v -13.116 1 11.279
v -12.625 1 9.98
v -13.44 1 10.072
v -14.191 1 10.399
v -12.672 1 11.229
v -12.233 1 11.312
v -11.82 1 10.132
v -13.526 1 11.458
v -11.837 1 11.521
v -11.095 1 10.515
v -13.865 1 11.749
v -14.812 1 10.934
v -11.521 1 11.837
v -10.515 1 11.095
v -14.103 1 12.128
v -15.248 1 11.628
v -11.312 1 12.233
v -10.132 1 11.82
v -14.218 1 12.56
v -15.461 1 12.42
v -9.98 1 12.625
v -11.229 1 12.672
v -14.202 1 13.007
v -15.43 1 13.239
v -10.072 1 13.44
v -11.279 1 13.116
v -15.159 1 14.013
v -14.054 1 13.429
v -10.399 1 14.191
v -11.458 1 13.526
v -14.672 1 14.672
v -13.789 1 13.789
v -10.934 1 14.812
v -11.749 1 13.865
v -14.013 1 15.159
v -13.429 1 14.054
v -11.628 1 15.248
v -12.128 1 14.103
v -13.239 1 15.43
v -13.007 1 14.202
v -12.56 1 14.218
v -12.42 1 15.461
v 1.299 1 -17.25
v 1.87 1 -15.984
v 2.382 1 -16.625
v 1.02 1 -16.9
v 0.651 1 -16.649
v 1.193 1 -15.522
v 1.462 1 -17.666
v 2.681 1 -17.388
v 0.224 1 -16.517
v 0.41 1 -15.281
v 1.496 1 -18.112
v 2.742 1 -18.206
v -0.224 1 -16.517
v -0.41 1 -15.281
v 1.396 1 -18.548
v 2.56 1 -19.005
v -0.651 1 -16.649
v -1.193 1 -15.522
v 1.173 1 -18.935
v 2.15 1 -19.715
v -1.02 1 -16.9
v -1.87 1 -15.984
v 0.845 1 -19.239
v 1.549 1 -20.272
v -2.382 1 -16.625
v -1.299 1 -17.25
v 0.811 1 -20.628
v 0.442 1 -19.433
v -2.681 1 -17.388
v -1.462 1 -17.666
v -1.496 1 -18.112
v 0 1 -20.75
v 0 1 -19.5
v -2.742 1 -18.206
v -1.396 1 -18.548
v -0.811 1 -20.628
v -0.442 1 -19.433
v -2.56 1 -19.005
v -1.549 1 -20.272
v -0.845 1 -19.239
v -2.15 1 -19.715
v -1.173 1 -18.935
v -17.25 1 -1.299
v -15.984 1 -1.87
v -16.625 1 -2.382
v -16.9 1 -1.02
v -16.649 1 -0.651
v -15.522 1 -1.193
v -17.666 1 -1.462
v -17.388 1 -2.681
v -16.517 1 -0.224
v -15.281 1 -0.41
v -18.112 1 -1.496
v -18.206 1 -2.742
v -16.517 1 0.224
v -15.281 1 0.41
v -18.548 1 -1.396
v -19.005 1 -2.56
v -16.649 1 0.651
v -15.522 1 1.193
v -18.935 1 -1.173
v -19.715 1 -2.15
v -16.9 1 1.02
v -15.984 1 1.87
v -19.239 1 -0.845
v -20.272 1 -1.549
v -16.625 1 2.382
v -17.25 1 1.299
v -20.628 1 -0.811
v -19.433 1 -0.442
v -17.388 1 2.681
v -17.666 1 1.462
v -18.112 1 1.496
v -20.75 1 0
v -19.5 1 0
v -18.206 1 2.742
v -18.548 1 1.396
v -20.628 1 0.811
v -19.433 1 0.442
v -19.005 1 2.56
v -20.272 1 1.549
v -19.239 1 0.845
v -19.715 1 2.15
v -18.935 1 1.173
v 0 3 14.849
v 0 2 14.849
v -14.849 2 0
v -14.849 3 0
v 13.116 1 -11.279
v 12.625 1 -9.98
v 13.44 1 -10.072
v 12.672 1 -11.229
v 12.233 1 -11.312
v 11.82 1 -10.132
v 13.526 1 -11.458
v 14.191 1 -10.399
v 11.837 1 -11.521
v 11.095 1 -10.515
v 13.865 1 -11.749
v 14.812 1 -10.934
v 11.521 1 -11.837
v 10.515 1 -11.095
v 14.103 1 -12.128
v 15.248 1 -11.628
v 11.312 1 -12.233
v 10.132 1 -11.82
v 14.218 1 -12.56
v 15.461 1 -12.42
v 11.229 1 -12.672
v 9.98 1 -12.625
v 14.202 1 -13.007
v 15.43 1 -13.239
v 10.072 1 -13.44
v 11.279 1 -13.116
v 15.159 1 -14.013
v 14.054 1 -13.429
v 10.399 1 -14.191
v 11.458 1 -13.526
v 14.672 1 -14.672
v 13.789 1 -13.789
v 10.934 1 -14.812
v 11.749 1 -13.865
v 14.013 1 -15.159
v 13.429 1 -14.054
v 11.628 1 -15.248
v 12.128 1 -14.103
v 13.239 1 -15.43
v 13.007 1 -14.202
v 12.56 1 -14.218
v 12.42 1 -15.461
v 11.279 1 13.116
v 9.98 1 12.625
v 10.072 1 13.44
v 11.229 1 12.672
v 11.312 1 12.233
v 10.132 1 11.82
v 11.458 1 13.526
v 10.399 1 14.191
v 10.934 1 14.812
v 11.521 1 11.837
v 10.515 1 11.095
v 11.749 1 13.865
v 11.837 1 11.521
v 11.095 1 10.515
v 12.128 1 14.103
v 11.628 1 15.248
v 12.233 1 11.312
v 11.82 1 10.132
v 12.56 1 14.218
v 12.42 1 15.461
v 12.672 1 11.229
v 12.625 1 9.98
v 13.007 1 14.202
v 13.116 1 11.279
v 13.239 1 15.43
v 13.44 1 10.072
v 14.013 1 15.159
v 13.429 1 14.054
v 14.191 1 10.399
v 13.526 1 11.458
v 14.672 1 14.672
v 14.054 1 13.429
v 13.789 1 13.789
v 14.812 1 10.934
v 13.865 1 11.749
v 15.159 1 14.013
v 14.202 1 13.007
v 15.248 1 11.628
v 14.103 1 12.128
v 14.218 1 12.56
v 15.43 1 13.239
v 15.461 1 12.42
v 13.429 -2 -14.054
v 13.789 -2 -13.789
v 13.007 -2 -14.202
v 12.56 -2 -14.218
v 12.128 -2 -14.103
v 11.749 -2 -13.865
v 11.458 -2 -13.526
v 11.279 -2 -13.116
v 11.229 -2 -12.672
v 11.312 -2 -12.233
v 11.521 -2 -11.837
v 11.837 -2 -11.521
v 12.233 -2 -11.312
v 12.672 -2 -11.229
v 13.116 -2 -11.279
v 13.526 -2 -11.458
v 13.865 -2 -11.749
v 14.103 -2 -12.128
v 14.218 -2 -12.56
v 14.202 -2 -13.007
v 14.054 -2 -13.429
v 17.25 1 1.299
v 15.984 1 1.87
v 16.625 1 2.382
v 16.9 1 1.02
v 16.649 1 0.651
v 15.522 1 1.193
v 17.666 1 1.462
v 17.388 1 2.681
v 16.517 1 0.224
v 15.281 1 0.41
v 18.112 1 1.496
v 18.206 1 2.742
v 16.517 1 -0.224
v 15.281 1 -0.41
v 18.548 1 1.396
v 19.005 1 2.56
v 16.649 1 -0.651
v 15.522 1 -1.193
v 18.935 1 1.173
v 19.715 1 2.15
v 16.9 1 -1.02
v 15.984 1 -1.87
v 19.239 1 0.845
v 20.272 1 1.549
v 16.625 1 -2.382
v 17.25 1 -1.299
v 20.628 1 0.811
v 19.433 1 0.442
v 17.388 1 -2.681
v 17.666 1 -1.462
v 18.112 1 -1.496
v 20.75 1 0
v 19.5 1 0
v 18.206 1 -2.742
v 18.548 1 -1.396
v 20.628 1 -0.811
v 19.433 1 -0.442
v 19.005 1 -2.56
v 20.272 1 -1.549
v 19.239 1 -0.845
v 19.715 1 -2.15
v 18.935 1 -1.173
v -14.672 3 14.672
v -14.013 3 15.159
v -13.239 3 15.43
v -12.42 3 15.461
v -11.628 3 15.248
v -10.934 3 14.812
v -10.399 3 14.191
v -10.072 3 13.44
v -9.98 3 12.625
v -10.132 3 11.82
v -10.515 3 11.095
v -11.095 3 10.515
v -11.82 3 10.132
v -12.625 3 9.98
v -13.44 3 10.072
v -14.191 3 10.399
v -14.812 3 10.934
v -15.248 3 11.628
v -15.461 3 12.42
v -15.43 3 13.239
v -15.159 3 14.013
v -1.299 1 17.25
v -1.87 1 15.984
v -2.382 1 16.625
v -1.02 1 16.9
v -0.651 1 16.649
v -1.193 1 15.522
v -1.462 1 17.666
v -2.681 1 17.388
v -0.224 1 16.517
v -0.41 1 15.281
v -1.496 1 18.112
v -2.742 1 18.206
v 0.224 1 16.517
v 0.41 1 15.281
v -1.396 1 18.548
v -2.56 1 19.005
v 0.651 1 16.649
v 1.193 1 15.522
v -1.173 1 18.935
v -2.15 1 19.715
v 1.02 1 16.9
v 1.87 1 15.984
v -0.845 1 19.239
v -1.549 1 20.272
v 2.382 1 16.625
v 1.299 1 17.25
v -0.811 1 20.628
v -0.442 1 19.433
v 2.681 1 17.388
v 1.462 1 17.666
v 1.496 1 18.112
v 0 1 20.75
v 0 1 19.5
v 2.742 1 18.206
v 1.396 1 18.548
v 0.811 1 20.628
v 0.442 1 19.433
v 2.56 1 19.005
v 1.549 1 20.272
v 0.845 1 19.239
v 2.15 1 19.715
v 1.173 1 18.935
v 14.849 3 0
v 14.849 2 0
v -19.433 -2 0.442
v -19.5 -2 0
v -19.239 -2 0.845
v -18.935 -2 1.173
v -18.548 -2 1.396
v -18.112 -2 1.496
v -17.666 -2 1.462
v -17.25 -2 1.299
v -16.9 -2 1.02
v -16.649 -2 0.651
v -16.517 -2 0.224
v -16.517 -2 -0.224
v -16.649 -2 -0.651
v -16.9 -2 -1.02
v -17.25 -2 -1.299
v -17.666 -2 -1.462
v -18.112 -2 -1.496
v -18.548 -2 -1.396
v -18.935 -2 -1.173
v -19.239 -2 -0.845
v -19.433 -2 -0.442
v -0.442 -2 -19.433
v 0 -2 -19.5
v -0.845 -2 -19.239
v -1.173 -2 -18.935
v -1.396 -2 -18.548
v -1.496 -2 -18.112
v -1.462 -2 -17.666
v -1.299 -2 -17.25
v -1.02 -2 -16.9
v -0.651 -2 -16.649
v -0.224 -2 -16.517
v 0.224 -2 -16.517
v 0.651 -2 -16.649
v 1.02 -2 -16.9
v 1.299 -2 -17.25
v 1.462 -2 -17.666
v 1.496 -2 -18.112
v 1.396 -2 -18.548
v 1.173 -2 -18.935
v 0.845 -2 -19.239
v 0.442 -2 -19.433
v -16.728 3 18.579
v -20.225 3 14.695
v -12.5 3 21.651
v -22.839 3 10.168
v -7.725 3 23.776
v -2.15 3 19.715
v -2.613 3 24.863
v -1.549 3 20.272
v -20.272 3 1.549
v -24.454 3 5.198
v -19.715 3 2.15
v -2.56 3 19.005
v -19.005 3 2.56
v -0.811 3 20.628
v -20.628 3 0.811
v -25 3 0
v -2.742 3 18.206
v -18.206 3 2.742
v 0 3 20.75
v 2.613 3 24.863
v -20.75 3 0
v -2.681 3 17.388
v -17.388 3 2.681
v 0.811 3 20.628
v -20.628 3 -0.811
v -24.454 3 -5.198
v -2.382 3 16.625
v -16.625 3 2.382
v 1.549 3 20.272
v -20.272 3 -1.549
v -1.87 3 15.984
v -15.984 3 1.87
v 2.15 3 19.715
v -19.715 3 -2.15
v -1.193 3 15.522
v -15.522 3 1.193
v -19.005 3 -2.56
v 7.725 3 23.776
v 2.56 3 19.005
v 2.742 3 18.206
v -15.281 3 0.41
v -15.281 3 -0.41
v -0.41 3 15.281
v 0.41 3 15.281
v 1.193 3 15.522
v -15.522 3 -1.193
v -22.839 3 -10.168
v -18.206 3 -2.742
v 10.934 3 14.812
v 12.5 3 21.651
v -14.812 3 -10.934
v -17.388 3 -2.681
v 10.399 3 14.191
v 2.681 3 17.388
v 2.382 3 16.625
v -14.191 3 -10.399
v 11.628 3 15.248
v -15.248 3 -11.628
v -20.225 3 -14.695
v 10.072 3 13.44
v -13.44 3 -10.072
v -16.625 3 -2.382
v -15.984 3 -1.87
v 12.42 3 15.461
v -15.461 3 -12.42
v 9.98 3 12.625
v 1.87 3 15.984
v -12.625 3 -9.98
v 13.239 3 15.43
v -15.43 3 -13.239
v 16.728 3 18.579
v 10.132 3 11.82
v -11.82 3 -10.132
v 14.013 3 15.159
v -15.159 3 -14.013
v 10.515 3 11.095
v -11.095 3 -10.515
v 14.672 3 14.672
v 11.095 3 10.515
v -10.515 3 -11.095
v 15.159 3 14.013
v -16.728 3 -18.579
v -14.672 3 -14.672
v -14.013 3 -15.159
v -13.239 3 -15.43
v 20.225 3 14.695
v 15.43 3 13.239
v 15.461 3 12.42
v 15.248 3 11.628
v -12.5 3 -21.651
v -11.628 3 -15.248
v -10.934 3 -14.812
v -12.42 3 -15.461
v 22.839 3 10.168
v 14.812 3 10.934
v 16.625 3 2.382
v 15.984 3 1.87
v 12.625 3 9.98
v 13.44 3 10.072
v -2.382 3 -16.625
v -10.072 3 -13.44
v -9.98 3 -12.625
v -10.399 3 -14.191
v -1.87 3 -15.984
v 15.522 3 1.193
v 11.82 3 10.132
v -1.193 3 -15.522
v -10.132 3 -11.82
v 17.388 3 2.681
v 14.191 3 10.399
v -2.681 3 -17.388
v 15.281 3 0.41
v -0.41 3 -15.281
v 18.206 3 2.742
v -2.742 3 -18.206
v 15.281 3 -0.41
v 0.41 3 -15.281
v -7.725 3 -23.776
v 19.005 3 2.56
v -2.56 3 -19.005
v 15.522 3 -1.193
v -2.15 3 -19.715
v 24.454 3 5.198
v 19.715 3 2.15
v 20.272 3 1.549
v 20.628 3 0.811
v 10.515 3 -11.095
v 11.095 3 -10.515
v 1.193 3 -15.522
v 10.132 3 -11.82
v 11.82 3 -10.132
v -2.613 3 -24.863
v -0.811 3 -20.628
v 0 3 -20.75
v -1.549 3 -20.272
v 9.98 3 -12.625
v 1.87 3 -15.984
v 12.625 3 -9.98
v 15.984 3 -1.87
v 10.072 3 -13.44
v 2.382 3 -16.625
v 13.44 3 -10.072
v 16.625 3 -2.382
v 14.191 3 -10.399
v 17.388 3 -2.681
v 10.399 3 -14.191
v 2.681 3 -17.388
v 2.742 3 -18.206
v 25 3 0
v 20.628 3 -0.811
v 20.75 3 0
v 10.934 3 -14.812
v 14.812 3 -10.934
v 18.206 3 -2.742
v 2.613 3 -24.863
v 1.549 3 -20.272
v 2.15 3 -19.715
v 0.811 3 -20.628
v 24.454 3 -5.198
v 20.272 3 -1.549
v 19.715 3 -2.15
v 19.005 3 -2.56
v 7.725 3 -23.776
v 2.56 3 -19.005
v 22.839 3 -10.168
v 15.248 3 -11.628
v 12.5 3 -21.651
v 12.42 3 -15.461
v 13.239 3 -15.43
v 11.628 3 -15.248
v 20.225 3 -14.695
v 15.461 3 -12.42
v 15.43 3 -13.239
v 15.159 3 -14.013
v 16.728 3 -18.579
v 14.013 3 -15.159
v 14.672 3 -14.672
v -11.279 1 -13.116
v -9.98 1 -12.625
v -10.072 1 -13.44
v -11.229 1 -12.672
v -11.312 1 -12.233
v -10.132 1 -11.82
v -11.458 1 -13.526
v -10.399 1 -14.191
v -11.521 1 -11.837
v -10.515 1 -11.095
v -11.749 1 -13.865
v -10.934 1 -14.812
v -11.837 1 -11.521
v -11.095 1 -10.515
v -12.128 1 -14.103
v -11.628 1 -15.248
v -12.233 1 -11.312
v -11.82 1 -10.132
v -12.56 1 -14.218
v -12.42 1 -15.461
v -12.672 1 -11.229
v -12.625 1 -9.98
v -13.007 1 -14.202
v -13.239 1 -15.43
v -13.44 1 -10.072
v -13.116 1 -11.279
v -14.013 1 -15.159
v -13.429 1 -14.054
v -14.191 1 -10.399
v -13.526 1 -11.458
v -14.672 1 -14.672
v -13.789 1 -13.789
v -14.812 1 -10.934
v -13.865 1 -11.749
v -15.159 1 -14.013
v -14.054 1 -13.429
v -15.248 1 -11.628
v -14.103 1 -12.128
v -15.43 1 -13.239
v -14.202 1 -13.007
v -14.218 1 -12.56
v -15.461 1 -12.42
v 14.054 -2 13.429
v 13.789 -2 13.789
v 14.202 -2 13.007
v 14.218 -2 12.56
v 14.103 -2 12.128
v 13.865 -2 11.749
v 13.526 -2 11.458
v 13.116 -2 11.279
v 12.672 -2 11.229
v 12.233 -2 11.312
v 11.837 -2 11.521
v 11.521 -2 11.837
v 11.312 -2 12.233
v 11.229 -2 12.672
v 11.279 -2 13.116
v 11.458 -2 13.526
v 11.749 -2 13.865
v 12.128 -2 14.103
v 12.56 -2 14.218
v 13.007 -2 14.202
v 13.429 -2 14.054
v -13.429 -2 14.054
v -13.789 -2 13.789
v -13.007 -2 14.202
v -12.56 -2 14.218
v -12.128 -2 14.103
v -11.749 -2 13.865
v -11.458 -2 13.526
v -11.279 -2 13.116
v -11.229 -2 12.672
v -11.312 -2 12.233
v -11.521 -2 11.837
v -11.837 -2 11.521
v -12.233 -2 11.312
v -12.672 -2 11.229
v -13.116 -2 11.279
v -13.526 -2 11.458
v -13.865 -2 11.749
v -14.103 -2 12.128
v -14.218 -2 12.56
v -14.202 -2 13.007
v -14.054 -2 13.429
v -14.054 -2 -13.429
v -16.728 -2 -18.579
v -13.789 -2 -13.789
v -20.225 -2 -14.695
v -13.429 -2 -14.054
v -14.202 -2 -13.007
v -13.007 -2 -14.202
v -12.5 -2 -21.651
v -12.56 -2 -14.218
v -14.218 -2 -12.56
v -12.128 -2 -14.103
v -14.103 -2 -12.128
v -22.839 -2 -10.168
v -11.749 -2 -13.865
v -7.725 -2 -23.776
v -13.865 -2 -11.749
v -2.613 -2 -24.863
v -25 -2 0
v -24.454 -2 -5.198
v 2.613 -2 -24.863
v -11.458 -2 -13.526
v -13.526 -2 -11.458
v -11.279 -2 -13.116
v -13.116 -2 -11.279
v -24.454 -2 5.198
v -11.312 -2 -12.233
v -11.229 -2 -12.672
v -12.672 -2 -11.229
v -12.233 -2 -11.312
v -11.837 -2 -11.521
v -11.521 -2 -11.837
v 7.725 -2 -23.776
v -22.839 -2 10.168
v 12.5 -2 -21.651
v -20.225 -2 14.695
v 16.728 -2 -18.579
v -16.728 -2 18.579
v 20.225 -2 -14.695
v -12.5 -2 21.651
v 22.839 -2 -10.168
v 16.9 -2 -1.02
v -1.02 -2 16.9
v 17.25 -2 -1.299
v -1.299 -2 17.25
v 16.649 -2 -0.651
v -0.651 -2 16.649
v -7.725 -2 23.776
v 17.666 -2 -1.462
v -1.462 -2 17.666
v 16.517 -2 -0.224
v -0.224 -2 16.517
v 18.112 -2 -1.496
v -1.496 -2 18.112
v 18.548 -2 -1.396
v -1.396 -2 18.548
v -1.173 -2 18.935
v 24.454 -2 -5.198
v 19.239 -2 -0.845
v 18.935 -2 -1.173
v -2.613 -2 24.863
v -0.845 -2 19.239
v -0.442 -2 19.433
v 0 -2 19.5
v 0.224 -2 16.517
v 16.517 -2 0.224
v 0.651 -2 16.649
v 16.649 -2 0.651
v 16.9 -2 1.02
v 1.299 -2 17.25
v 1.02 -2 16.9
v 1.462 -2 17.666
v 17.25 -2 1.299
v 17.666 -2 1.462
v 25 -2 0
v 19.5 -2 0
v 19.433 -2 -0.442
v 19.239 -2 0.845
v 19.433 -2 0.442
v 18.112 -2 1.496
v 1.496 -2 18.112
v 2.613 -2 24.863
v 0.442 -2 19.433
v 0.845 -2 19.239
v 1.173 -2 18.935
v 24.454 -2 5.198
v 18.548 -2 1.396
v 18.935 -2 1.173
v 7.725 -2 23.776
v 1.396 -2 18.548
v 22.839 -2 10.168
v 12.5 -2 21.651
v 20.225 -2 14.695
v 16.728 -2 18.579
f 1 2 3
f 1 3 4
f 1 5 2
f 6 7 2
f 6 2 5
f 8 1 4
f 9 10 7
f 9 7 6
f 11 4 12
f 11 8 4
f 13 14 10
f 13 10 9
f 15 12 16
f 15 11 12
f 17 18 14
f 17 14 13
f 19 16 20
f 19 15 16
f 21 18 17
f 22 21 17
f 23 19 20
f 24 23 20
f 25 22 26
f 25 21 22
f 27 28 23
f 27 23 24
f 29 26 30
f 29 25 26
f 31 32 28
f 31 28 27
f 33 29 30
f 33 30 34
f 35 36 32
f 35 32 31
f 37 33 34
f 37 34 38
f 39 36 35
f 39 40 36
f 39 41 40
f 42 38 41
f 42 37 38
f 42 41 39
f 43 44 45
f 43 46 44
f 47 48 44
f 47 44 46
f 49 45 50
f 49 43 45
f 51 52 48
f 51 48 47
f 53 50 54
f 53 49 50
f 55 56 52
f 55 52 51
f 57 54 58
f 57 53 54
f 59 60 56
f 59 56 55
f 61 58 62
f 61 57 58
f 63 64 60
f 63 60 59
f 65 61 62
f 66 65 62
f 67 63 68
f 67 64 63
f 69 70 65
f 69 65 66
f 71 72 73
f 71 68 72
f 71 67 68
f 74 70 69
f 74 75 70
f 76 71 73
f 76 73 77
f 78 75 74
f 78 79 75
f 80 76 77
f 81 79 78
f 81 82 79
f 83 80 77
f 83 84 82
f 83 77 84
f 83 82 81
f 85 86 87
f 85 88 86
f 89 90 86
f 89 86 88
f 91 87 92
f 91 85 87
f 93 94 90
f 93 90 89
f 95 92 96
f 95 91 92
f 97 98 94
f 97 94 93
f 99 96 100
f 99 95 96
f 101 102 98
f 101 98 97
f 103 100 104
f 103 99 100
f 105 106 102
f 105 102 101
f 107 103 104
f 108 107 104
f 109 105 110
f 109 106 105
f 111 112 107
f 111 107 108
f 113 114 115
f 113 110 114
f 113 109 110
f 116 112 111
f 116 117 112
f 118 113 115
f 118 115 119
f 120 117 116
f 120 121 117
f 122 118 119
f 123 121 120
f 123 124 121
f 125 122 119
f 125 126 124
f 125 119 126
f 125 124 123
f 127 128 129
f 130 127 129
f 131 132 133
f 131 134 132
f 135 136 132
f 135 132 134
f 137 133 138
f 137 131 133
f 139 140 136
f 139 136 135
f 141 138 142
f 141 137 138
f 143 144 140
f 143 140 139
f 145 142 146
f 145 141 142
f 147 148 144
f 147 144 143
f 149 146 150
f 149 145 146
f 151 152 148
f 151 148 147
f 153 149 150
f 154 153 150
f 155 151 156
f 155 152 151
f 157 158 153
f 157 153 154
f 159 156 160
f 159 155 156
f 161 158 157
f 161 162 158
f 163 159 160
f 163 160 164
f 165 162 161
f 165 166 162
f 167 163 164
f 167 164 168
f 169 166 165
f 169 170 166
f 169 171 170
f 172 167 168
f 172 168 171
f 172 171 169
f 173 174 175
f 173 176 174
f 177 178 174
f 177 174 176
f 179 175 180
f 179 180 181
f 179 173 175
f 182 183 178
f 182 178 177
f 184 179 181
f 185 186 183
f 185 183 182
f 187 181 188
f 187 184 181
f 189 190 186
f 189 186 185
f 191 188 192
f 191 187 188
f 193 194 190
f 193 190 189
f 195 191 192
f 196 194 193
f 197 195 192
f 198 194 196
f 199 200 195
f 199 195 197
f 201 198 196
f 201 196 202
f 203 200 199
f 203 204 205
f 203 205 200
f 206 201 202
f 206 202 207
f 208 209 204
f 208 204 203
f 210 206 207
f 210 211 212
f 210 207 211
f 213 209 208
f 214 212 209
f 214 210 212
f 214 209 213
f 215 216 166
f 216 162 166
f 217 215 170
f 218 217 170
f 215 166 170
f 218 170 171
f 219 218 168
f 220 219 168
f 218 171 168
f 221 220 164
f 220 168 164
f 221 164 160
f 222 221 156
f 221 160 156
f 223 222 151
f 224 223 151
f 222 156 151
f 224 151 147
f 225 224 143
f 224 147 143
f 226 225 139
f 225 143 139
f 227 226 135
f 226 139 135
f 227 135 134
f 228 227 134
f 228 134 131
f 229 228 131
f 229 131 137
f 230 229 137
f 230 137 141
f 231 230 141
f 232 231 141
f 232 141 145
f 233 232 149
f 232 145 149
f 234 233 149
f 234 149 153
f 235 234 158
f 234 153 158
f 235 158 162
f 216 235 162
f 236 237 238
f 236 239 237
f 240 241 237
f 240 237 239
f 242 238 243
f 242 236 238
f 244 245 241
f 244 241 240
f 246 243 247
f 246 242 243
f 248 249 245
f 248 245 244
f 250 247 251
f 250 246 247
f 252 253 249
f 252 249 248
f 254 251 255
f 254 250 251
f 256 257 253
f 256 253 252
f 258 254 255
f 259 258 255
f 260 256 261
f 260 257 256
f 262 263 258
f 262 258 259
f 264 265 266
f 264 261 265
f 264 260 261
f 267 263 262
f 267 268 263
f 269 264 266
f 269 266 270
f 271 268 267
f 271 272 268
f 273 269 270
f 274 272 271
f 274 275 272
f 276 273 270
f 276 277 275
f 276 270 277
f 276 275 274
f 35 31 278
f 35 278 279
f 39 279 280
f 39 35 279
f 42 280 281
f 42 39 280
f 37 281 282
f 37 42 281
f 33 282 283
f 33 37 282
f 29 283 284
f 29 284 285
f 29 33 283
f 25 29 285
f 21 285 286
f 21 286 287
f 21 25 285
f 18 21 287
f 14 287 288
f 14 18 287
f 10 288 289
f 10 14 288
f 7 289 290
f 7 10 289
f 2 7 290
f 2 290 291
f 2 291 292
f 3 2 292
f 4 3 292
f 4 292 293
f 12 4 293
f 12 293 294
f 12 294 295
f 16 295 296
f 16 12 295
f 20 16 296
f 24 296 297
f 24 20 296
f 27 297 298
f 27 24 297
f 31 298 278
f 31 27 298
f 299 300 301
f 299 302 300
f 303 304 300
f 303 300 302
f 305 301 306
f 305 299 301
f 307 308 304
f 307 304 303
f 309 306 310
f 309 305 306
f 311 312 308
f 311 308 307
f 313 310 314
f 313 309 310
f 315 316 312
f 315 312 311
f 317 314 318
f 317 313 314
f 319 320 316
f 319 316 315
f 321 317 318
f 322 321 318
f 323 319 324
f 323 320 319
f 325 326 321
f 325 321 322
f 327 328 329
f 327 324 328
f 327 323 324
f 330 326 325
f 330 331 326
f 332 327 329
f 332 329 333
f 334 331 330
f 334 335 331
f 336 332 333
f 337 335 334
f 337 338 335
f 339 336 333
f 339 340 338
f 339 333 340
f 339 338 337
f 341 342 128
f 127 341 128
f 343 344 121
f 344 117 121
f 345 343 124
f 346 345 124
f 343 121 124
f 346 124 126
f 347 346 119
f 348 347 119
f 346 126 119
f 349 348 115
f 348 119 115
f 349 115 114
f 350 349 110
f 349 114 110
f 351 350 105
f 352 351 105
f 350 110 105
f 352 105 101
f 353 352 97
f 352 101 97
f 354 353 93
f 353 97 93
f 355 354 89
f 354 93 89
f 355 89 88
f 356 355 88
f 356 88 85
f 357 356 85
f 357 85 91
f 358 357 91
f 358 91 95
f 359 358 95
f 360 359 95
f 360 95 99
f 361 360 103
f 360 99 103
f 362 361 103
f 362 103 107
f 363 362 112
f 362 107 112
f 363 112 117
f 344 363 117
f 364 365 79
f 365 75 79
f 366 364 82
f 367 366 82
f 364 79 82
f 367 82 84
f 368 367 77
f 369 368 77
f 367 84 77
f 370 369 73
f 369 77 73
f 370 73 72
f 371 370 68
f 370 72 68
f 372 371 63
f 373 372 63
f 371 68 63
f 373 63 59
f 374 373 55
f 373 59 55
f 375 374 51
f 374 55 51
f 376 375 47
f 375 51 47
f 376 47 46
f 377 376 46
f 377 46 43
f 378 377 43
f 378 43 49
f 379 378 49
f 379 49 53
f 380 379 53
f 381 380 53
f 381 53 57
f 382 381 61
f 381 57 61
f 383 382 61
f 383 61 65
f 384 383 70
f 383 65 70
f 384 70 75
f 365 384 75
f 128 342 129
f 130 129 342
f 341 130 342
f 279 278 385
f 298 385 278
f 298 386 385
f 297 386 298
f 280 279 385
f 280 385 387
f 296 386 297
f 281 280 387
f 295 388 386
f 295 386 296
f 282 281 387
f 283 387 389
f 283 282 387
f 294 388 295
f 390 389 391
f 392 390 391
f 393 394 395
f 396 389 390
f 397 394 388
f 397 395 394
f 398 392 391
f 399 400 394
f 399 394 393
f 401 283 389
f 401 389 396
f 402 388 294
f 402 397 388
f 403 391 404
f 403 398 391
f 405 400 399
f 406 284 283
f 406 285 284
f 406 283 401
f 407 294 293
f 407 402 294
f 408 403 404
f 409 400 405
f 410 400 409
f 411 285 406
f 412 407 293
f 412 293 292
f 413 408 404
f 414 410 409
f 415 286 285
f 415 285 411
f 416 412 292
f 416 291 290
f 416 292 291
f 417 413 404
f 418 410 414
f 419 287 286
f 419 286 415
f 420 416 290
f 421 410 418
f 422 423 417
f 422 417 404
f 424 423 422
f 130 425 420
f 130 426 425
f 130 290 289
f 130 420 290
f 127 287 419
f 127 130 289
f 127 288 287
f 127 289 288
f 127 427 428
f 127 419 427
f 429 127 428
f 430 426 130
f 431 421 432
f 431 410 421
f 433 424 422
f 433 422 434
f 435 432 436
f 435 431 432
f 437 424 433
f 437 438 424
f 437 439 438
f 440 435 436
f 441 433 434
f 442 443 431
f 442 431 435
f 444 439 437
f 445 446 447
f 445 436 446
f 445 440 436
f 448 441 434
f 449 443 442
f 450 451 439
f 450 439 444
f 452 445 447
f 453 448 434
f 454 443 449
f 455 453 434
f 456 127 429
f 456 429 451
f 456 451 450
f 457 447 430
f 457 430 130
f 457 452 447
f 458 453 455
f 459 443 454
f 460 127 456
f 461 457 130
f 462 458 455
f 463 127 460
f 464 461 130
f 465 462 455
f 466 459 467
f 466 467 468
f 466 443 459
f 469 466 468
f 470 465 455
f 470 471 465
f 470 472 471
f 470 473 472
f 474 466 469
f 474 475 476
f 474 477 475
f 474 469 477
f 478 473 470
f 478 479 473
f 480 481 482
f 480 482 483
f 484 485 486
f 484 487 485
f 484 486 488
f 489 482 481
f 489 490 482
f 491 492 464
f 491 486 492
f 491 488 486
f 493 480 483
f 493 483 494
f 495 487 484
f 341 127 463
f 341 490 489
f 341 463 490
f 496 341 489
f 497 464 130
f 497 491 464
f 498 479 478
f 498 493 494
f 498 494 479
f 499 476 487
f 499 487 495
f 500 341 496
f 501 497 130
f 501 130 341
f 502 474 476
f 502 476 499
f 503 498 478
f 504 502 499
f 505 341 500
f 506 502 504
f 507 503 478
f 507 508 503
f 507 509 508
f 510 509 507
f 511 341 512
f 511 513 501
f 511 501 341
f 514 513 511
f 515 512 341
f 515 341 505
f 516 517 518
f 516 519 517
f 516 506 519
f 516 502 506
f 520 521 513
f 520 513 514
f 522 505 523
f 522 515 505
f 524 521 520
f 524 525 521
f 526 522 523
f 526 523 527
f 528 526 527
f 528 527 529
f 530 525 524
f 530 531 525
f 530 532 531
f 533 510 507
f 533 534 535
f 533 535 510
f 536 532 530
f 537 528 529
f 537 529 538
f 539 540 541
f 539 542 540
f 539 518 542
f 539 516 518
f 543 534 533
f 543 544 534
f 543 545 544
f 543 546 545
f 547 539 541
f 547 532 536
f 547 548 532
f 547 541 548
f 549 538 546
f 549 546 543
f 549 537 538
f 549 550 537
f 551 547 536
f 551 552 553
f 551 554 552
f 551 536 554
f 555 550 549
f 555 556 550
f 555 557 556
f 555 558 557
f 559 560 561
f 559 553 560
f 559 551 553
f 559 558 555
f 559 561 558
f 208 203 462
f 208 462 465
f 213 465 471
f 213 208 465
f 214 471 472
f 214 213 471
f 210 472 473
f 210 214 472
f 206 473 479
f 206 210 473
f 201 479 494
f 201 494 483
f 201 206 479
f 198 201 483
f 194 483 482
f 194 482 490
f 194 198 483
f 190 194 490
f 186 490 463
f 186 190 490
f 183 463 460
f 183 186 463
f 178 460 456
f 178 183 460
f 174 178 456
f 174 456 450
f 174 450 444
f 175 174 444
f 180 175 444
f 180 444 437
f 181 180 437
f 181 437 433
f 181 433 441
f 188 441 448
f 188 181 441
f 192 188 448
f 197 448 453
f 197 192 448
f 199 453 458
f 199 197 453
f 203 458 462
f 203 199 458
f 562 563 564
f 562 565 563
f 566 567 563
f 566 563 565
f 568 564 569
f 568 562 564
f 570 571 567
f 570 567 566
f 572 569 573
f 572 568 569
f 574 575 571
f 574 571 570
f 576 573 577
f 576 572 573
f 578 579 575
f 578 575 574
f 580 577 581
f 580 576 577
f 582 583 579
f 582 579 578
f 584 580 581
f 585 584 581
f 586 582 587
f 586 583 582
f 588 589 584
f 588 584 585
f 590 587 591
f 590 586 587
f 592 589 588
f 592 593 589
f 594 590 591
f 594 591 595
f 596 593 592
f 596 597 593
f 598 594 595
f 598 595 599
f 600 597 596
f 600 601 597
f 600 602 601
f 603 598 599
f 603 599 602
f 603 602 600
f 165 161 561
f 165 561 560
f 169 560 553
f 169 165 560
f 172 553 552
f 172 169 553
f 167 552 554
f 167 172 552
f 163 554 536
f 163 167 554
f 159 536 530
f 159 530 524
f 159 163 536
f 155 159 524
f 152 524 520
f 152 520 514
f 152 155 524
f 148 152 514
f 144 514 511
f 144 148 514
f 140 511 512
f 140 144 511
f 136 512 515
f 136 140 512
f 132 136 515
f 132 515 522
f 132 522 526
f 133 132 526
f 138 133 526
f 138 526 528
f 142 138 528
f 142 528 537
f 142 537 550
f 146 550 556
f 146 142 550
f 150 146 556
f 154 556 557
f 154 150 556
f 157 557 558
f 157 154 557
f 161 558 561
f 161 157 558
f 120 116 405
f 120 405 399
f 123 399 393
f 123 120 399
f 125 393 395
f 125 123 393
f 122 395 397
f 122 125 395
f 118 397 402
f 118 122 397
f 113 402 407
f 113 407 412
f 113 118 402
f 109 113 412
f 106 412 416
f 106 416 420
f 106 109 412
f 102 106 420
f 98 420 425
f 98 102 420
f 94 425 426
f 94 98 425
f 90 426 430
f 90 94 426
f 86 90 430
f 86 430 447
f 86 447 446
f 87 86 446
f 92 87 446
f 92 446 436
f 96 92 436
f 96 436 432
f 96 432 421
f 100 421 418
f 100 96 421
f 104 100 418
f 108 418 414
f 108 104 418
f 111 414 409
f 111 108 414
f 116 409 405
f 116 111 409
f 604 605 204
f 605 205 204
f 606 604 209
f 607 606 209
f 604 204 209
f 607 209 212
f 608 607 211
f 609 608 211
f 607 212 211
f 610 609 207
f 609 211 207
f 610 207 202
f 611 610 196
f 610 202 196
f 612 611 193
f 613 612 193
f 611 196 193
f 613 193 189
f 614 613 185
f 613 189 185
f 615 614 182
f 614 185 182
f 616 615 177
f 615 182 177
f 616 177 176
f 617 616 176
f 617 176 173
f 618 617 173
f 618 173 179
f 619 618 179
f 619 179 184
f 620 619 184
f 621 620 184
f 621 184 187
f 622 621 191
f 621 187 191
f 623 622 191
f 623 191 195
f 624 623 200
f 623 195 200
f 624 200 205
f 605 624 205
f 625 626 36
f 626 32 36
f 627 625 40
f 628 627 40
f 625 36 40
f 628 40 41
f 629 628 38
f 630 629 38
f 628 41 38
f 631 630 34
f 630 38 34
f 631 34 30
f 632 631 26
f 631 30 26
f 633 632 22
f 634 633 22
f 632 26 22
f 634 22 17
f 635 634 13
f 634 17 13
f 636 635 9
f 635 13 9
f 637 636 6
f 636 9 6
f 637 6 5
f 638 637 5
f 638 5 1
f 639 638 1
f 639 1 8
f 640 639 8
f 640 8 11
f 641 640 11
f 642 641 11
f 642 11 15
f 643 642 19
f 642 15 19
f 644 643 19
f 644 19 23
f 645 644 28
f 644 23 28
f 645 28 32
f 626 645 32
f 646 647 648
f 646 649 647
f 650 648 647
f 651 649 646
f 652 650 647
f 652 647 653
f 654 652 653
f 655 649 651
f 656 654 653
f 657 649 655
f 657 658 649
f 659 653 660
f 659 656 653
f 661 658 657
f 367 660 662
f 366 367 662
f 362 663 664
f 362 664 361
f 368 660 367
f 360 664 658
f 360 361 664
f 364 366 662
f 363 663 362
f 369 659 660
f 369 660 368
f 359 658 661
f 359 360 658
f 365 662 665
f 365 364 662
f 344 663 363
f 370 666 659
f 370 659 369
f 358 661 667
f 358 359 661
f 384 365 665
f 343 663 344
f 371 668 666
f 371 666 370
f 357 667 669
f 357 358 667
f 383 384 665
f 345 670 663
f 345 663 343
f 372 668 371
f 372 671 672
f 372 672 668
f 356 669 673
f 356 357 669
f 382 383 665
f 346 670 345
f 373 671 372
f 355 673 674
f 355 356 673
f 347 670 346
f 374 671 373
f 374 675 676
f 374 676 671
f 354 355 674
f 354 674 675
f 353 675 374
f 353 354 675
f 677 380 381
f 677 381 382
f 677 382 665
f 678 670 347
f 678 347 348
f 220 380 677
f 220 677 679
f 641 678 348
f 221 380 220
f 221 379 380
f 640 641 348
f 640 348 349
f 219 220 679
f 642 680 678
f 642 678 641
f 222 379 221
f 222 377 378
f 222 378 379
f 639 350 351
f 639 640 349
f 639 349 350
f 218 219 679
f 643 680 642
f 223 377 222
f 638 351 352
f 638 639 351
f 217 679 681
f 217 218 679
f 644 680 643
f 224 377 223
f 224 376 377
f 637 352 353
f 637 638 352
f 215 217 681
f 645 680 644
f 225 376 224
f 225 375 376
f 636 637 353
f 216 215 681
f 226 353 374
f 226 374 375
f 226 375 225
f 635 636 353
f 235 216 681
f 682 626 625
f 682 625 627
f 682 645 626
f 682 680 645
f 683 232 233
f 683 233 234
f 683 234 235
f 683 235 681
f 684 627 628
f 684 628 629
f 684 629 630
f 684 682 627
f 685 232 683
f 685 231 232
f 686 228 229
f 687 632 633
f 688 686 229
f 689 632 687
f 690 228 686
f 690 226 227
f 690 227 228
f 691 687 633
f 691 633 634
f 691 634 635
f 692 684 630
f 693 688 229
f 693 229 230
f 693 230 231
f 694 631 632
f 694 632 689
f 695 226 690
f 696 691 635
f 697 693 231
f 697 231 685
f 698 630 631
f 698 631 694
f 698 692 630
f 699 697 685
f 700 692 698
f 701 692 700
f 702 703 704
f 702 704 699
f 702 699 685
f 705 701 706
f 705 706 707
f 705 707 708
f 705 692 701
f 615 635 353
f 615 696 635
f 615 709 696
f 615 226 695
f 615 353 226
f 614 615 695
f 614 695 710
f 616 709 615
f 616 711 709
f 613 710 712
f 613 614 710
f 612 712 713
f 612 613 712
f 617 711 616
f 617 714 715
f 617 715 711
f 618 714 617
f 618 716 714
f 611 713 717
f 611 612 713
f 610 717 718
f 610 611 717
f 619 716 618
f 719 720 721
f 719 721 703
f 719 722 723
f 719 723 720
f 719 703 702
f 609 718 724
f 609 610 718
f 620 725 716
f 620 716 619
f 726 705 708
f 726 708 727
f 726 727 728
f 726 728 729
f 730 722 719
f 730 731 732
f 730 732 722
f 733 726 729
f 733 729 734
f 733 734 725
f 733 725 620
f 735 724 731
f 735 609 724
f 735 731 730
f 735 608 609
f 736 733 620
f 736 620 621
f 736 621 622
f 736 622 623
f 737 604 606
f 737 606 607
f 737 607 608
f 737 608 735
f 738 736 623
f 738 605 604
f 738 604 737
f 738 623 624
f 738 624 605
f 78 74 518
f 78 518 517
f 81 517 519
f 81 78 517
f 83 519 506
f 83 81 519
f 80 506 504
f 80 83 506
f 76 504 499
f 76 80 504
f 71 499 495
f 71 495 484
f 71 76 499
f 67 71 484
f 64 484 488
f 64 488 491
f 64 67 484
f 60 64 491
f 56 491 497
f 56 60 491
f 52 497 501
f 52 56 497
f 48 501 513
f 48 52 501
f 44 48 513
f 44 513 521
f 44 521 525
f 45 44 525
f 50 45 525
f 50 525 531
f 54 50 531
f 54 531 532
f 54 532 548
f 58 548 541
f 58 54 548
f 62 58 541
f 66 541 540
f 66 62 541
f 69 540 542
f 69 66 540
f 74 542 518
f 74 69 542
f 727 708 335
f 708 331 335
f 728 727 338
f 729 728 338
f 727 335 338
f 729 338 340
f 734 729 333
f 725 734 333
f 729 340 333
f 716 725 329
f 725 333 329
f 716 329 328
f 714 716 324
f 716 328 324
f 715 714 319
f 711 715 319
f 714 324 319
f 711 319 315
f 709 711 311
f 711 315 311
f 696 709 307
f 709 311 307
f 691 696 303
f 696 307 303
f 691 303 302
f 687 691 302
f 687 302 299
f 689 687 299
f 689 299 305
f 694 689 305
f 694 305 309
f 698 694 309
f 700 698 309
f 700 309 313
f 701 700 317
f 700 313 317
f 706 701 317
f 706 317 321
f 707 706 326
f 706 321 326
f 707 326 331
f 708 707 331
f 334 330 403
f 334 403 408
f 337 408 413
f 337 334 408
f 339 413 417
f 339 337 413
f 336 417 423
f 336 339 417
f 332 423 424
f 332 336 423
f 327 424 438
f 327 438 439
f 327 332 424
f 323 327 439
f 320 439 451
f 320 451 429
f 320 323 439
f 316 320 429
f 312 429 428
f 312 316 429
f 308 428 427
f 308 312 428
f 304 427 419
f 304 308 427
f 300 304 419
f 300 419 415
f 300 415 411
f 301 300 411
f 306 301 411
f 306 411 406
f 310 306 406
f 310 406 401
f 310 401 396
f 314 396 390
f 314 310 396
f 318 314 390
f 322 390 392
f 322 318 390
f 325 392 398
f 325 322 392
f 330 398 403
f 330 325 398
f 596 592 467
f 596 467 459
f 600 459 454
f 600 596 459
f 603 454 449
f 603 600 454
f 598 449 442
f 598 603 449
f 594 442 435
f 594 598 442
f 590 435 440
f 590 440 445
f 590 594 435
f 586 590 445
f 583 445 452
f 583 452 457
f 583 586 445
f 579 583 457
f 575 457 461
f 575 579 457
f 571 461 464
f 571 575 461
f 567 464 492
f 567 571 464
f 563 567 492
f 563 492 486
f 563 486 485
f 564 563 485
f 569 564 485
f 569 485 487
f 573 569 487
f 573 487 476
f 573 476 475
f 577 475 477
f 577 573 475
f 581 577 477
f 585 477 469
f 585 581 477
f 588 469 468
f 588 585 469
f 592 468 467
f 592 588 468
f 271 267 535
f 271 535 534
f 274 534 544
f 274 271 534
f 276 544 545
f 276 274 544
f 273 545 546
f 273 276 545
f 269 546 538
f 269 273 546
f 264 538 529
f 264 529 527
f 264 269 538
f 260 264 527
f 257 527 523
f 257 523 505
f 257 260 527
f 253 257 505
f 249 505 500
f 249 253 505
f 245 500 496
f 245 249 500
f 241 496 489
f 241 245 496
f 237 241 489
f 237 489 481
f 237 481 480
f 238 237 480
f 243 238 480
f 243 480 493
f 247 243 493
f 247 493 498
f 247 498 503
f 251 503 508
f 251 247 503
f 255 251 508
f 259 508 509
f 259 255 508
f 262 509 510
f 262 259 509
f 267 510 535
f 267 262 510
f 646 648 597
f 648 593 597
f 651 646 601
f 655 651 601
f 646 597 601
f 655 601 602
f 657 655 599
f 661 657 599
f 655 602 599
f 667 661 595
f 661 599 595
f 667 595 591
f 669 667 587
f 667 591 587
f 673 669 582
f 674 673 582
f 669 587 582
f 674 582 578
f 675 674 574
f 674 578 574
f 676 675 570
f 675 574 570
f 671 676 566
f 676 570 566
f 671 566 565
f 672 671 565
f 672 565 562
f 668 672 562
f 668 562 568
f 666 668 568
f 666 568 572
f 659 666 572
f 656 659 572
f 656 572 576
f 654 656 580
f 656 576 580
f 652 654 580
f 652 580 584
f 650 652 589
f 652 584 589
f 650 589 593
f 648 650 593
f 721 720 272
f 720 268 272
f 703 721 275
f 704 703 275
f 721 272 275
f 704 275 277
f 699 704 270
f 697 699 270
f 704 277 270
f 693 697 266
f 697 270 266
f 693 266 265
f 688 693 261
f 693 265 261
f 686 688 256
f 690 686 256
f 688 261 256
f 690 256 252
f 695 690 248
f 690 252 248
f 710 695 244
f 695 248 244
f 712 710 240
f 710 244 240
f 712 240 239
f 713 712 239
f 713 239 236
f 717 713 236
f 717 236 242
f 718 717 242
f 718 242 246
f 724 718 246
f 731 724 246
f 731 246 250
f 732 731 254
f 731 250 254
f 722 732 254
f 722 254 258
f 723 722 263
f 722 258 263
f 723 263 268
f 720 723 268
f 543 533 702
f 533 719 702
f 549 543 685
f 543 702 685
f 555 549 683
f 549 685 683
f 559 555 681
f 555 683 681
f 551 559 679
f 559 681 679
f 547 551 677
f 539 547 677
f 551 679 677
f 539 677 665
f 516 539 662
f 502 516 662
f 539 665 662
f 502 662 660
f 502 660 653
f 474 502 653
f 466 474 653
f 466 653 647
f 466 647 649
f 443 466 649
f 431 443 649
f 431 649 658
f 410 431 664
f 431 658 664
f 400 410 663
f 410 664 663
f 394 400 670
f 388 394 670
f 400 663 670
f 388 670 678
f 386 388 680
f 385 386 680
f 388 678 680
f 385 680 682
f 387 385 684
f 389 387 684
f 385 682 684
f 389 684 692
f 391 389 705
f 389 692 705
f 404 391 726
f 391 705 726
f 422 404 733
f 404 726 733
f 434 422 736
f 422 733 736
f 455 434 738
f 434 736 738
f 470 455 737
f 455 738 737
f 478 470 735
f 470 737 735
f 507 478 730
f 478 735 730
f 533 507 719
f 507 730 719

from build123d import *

# Parameters (mm, degrees)
SKETCH_1_R               = 25
EXTRUDE_2_DEPTH          = 1
SKETCH_2_R               = 1.5
CUT_EXTRUDE_1_DEPTH      = 1
PATTERN_CIRCULAR_1_COUNT = 8
CUT_EXTRUDE_2_DEPTH      = 1
EXTRUDE_3_DEPTH          = 1
SKETCH_5_R               = 25
EXTRUDE_5_DEPTH          = 2
SKETCH_6_R               = 1.5
CUT_EXTRUDE_3_DEPTH      = 2
PATTERN_CIRCULAR_2_COUNT = 8
SKETCH_7_R               = 25
EXTRUDE_6_DEPTH          = 2
SKETCH_8_R               = 2.75
CUT_EXTRUDE_4_DEPTH      = 2
PATTERN_CIRCULAR_3_COUNT = 8
EXTRUDE_8_DEPTH          = 2


with BuildPart() as part:
    # 草图1 → 凸台-拉伸2 (new body)
    with BuildSketch(Plane(origin=(0, 0, 0), x_dir=(1, 0, 0), z_dir=(0, 1, 0))):
        Circle(SKETCH_1_R)
    extrude(amount=EXTRUDE_2_DEPTH)

    # 草图2 → 切除-拉伸1 (cut)
    with BuildSketch(Plane(origin=(0, 1, 0), x_dir=(1, 0, 0), z_dir=(0, 1, 0))):
        with Locations((18, 0)):
            Circle(SKETCH_2_R)
    cut_extrude_1 = extrude(amount=-CUT_EXTRUDE_1_DEPTH, mode=Mode.SUBTRACT)

    # 阵列(圆周)1: 切除-拉伸1 ×8 about axis
    pattern_circular_1_axis = Axis((0, 0, 0), (0, 1, 0))
    for i in range(1, PATTERN_CIRCULAR_1_COUNT):
        add(cut_extrude_1.rotate(pattern_circular_1_axis, i * 360 / PATTERN_CIRCULAR_1_COUNT), mode=Mode.SUBTRACT)

    # 草图3 → 切除-拉伸2 (cut)
    with BuildSketch(Plane(origin=(0, 1, 0), x_dir=(1, 0, 0), z_dir=(0, 1, 0))):
        Polygon((-15.202795796, 0), (15.202795796, 0), (0, -15.202795796), align=None)
    extrude(amount=-CUT_EXTRUDE_2_DEPTH, mode=Mode.SUBTRACT)

    # 草图4 → 凸台-拉伸3 (add)
    with BuildSketch(Plane(origin=(0, 1, 0), x_dir=(1, 0, 0), z_dir=(0, 1, 0))):
        Polygon((0, -14.849242405), (14.849242405, 0), (15.202795796, 0), (0, -15.202795796), (-15.202795796, 0), (-14.849242405, 0), align=None)
    extrude(amount=-EXTRUDE_3_DEPTH)

    # 草图5 → 凸台-拉伸5 (add)
    with BuildSketch(Plane.XZ):
        Circle(SKETCH_5_R)
    extrude(amount=EXTRUDE_5_DEPTH)

    # 草图6 → 切除-拉伸3 (cut)
    with BuildSketch(Plane(origin=(0, 0, 0), x_dir=(1, 0, 0), z_dir=(0, 1, 0))):
        with Locations((18, 0)):
            Circle(SKETCH_6_R)
    cut_extrude_3 = extrude(amount=-CUT_EXTRUDE_3_DEPTH, mode=Mode.SUBTRACT)

    # 阵列(圆周)2: 切除-拉伸3 ×8 about axis
    pattern_circular_2_axis = Axis((0, 1, 0), (0, -1, 0))
    for i in range(1, PATTERN_CIRCULAR_2_COUNT):
        add(cut_extrude_3.rotate(pattern_circular_2_axis, i * 360 / PATTERN_CIRCULAR_2_COUNT), mode=Mode.SUBTRACT)

    # 草图7 → 凸台-拉伸6 (add)
    with BuildSketch(Plane(origin=(0, 1, 0), x_dir=(1, 0, 0), z_dir=(0, 1, 0))):
        Circle(SKETCH_7_R)
        Polygon((-14.849242405, 0), (14.849242405, 0), (0, -14.849242405), align=None, mode=Mode.SUBTRACT)
    extrude(amount=EXTRUDE_6_DEPTH)

    # 草图8 → 切除-拉伸4 (cut)
    with BuildSketch(Plane(origin=(0, 1, 0), x_dir=(1, 0, 0), z_dir=(0, 1, 0))):
        with Locations((18, 0)):
            Circle(SKETCH_8_R)
    cut_extrude_4 = extrude(amount=CUT_EXTRUDE_4_DEPTH, mode=Mode.SUBTRACT)

    # 阵列(圆周)3: 切除-拉伸4 ×8 about axis
    pattern_circular_3_axis = Axis((0, 0, 0), (0, 1, 0))
    for i in range(1, PATTERN_CIRCULAR_3_COUNT):
        add(cut_extrude_4.rotate(pattern_circular_3_axis, i * 360 / PATTERN_CIRCULAR_3_COUNT), mode=Mode.SUBTRACT)

    # 草图9 → 凸台-拉伸8 (add)
    with BuildSketch(Plane(origin=(0, 0, 0), x_dir=(1, 0, 0), z_dir=(0, 1, 0))):
        Polygon((-14.849242405, 0), (14.849242405, 0), (0, -14.849242405), align=None)
    extrude(amount=EXTRUDE_8_DEPTH)


solid = part.part
